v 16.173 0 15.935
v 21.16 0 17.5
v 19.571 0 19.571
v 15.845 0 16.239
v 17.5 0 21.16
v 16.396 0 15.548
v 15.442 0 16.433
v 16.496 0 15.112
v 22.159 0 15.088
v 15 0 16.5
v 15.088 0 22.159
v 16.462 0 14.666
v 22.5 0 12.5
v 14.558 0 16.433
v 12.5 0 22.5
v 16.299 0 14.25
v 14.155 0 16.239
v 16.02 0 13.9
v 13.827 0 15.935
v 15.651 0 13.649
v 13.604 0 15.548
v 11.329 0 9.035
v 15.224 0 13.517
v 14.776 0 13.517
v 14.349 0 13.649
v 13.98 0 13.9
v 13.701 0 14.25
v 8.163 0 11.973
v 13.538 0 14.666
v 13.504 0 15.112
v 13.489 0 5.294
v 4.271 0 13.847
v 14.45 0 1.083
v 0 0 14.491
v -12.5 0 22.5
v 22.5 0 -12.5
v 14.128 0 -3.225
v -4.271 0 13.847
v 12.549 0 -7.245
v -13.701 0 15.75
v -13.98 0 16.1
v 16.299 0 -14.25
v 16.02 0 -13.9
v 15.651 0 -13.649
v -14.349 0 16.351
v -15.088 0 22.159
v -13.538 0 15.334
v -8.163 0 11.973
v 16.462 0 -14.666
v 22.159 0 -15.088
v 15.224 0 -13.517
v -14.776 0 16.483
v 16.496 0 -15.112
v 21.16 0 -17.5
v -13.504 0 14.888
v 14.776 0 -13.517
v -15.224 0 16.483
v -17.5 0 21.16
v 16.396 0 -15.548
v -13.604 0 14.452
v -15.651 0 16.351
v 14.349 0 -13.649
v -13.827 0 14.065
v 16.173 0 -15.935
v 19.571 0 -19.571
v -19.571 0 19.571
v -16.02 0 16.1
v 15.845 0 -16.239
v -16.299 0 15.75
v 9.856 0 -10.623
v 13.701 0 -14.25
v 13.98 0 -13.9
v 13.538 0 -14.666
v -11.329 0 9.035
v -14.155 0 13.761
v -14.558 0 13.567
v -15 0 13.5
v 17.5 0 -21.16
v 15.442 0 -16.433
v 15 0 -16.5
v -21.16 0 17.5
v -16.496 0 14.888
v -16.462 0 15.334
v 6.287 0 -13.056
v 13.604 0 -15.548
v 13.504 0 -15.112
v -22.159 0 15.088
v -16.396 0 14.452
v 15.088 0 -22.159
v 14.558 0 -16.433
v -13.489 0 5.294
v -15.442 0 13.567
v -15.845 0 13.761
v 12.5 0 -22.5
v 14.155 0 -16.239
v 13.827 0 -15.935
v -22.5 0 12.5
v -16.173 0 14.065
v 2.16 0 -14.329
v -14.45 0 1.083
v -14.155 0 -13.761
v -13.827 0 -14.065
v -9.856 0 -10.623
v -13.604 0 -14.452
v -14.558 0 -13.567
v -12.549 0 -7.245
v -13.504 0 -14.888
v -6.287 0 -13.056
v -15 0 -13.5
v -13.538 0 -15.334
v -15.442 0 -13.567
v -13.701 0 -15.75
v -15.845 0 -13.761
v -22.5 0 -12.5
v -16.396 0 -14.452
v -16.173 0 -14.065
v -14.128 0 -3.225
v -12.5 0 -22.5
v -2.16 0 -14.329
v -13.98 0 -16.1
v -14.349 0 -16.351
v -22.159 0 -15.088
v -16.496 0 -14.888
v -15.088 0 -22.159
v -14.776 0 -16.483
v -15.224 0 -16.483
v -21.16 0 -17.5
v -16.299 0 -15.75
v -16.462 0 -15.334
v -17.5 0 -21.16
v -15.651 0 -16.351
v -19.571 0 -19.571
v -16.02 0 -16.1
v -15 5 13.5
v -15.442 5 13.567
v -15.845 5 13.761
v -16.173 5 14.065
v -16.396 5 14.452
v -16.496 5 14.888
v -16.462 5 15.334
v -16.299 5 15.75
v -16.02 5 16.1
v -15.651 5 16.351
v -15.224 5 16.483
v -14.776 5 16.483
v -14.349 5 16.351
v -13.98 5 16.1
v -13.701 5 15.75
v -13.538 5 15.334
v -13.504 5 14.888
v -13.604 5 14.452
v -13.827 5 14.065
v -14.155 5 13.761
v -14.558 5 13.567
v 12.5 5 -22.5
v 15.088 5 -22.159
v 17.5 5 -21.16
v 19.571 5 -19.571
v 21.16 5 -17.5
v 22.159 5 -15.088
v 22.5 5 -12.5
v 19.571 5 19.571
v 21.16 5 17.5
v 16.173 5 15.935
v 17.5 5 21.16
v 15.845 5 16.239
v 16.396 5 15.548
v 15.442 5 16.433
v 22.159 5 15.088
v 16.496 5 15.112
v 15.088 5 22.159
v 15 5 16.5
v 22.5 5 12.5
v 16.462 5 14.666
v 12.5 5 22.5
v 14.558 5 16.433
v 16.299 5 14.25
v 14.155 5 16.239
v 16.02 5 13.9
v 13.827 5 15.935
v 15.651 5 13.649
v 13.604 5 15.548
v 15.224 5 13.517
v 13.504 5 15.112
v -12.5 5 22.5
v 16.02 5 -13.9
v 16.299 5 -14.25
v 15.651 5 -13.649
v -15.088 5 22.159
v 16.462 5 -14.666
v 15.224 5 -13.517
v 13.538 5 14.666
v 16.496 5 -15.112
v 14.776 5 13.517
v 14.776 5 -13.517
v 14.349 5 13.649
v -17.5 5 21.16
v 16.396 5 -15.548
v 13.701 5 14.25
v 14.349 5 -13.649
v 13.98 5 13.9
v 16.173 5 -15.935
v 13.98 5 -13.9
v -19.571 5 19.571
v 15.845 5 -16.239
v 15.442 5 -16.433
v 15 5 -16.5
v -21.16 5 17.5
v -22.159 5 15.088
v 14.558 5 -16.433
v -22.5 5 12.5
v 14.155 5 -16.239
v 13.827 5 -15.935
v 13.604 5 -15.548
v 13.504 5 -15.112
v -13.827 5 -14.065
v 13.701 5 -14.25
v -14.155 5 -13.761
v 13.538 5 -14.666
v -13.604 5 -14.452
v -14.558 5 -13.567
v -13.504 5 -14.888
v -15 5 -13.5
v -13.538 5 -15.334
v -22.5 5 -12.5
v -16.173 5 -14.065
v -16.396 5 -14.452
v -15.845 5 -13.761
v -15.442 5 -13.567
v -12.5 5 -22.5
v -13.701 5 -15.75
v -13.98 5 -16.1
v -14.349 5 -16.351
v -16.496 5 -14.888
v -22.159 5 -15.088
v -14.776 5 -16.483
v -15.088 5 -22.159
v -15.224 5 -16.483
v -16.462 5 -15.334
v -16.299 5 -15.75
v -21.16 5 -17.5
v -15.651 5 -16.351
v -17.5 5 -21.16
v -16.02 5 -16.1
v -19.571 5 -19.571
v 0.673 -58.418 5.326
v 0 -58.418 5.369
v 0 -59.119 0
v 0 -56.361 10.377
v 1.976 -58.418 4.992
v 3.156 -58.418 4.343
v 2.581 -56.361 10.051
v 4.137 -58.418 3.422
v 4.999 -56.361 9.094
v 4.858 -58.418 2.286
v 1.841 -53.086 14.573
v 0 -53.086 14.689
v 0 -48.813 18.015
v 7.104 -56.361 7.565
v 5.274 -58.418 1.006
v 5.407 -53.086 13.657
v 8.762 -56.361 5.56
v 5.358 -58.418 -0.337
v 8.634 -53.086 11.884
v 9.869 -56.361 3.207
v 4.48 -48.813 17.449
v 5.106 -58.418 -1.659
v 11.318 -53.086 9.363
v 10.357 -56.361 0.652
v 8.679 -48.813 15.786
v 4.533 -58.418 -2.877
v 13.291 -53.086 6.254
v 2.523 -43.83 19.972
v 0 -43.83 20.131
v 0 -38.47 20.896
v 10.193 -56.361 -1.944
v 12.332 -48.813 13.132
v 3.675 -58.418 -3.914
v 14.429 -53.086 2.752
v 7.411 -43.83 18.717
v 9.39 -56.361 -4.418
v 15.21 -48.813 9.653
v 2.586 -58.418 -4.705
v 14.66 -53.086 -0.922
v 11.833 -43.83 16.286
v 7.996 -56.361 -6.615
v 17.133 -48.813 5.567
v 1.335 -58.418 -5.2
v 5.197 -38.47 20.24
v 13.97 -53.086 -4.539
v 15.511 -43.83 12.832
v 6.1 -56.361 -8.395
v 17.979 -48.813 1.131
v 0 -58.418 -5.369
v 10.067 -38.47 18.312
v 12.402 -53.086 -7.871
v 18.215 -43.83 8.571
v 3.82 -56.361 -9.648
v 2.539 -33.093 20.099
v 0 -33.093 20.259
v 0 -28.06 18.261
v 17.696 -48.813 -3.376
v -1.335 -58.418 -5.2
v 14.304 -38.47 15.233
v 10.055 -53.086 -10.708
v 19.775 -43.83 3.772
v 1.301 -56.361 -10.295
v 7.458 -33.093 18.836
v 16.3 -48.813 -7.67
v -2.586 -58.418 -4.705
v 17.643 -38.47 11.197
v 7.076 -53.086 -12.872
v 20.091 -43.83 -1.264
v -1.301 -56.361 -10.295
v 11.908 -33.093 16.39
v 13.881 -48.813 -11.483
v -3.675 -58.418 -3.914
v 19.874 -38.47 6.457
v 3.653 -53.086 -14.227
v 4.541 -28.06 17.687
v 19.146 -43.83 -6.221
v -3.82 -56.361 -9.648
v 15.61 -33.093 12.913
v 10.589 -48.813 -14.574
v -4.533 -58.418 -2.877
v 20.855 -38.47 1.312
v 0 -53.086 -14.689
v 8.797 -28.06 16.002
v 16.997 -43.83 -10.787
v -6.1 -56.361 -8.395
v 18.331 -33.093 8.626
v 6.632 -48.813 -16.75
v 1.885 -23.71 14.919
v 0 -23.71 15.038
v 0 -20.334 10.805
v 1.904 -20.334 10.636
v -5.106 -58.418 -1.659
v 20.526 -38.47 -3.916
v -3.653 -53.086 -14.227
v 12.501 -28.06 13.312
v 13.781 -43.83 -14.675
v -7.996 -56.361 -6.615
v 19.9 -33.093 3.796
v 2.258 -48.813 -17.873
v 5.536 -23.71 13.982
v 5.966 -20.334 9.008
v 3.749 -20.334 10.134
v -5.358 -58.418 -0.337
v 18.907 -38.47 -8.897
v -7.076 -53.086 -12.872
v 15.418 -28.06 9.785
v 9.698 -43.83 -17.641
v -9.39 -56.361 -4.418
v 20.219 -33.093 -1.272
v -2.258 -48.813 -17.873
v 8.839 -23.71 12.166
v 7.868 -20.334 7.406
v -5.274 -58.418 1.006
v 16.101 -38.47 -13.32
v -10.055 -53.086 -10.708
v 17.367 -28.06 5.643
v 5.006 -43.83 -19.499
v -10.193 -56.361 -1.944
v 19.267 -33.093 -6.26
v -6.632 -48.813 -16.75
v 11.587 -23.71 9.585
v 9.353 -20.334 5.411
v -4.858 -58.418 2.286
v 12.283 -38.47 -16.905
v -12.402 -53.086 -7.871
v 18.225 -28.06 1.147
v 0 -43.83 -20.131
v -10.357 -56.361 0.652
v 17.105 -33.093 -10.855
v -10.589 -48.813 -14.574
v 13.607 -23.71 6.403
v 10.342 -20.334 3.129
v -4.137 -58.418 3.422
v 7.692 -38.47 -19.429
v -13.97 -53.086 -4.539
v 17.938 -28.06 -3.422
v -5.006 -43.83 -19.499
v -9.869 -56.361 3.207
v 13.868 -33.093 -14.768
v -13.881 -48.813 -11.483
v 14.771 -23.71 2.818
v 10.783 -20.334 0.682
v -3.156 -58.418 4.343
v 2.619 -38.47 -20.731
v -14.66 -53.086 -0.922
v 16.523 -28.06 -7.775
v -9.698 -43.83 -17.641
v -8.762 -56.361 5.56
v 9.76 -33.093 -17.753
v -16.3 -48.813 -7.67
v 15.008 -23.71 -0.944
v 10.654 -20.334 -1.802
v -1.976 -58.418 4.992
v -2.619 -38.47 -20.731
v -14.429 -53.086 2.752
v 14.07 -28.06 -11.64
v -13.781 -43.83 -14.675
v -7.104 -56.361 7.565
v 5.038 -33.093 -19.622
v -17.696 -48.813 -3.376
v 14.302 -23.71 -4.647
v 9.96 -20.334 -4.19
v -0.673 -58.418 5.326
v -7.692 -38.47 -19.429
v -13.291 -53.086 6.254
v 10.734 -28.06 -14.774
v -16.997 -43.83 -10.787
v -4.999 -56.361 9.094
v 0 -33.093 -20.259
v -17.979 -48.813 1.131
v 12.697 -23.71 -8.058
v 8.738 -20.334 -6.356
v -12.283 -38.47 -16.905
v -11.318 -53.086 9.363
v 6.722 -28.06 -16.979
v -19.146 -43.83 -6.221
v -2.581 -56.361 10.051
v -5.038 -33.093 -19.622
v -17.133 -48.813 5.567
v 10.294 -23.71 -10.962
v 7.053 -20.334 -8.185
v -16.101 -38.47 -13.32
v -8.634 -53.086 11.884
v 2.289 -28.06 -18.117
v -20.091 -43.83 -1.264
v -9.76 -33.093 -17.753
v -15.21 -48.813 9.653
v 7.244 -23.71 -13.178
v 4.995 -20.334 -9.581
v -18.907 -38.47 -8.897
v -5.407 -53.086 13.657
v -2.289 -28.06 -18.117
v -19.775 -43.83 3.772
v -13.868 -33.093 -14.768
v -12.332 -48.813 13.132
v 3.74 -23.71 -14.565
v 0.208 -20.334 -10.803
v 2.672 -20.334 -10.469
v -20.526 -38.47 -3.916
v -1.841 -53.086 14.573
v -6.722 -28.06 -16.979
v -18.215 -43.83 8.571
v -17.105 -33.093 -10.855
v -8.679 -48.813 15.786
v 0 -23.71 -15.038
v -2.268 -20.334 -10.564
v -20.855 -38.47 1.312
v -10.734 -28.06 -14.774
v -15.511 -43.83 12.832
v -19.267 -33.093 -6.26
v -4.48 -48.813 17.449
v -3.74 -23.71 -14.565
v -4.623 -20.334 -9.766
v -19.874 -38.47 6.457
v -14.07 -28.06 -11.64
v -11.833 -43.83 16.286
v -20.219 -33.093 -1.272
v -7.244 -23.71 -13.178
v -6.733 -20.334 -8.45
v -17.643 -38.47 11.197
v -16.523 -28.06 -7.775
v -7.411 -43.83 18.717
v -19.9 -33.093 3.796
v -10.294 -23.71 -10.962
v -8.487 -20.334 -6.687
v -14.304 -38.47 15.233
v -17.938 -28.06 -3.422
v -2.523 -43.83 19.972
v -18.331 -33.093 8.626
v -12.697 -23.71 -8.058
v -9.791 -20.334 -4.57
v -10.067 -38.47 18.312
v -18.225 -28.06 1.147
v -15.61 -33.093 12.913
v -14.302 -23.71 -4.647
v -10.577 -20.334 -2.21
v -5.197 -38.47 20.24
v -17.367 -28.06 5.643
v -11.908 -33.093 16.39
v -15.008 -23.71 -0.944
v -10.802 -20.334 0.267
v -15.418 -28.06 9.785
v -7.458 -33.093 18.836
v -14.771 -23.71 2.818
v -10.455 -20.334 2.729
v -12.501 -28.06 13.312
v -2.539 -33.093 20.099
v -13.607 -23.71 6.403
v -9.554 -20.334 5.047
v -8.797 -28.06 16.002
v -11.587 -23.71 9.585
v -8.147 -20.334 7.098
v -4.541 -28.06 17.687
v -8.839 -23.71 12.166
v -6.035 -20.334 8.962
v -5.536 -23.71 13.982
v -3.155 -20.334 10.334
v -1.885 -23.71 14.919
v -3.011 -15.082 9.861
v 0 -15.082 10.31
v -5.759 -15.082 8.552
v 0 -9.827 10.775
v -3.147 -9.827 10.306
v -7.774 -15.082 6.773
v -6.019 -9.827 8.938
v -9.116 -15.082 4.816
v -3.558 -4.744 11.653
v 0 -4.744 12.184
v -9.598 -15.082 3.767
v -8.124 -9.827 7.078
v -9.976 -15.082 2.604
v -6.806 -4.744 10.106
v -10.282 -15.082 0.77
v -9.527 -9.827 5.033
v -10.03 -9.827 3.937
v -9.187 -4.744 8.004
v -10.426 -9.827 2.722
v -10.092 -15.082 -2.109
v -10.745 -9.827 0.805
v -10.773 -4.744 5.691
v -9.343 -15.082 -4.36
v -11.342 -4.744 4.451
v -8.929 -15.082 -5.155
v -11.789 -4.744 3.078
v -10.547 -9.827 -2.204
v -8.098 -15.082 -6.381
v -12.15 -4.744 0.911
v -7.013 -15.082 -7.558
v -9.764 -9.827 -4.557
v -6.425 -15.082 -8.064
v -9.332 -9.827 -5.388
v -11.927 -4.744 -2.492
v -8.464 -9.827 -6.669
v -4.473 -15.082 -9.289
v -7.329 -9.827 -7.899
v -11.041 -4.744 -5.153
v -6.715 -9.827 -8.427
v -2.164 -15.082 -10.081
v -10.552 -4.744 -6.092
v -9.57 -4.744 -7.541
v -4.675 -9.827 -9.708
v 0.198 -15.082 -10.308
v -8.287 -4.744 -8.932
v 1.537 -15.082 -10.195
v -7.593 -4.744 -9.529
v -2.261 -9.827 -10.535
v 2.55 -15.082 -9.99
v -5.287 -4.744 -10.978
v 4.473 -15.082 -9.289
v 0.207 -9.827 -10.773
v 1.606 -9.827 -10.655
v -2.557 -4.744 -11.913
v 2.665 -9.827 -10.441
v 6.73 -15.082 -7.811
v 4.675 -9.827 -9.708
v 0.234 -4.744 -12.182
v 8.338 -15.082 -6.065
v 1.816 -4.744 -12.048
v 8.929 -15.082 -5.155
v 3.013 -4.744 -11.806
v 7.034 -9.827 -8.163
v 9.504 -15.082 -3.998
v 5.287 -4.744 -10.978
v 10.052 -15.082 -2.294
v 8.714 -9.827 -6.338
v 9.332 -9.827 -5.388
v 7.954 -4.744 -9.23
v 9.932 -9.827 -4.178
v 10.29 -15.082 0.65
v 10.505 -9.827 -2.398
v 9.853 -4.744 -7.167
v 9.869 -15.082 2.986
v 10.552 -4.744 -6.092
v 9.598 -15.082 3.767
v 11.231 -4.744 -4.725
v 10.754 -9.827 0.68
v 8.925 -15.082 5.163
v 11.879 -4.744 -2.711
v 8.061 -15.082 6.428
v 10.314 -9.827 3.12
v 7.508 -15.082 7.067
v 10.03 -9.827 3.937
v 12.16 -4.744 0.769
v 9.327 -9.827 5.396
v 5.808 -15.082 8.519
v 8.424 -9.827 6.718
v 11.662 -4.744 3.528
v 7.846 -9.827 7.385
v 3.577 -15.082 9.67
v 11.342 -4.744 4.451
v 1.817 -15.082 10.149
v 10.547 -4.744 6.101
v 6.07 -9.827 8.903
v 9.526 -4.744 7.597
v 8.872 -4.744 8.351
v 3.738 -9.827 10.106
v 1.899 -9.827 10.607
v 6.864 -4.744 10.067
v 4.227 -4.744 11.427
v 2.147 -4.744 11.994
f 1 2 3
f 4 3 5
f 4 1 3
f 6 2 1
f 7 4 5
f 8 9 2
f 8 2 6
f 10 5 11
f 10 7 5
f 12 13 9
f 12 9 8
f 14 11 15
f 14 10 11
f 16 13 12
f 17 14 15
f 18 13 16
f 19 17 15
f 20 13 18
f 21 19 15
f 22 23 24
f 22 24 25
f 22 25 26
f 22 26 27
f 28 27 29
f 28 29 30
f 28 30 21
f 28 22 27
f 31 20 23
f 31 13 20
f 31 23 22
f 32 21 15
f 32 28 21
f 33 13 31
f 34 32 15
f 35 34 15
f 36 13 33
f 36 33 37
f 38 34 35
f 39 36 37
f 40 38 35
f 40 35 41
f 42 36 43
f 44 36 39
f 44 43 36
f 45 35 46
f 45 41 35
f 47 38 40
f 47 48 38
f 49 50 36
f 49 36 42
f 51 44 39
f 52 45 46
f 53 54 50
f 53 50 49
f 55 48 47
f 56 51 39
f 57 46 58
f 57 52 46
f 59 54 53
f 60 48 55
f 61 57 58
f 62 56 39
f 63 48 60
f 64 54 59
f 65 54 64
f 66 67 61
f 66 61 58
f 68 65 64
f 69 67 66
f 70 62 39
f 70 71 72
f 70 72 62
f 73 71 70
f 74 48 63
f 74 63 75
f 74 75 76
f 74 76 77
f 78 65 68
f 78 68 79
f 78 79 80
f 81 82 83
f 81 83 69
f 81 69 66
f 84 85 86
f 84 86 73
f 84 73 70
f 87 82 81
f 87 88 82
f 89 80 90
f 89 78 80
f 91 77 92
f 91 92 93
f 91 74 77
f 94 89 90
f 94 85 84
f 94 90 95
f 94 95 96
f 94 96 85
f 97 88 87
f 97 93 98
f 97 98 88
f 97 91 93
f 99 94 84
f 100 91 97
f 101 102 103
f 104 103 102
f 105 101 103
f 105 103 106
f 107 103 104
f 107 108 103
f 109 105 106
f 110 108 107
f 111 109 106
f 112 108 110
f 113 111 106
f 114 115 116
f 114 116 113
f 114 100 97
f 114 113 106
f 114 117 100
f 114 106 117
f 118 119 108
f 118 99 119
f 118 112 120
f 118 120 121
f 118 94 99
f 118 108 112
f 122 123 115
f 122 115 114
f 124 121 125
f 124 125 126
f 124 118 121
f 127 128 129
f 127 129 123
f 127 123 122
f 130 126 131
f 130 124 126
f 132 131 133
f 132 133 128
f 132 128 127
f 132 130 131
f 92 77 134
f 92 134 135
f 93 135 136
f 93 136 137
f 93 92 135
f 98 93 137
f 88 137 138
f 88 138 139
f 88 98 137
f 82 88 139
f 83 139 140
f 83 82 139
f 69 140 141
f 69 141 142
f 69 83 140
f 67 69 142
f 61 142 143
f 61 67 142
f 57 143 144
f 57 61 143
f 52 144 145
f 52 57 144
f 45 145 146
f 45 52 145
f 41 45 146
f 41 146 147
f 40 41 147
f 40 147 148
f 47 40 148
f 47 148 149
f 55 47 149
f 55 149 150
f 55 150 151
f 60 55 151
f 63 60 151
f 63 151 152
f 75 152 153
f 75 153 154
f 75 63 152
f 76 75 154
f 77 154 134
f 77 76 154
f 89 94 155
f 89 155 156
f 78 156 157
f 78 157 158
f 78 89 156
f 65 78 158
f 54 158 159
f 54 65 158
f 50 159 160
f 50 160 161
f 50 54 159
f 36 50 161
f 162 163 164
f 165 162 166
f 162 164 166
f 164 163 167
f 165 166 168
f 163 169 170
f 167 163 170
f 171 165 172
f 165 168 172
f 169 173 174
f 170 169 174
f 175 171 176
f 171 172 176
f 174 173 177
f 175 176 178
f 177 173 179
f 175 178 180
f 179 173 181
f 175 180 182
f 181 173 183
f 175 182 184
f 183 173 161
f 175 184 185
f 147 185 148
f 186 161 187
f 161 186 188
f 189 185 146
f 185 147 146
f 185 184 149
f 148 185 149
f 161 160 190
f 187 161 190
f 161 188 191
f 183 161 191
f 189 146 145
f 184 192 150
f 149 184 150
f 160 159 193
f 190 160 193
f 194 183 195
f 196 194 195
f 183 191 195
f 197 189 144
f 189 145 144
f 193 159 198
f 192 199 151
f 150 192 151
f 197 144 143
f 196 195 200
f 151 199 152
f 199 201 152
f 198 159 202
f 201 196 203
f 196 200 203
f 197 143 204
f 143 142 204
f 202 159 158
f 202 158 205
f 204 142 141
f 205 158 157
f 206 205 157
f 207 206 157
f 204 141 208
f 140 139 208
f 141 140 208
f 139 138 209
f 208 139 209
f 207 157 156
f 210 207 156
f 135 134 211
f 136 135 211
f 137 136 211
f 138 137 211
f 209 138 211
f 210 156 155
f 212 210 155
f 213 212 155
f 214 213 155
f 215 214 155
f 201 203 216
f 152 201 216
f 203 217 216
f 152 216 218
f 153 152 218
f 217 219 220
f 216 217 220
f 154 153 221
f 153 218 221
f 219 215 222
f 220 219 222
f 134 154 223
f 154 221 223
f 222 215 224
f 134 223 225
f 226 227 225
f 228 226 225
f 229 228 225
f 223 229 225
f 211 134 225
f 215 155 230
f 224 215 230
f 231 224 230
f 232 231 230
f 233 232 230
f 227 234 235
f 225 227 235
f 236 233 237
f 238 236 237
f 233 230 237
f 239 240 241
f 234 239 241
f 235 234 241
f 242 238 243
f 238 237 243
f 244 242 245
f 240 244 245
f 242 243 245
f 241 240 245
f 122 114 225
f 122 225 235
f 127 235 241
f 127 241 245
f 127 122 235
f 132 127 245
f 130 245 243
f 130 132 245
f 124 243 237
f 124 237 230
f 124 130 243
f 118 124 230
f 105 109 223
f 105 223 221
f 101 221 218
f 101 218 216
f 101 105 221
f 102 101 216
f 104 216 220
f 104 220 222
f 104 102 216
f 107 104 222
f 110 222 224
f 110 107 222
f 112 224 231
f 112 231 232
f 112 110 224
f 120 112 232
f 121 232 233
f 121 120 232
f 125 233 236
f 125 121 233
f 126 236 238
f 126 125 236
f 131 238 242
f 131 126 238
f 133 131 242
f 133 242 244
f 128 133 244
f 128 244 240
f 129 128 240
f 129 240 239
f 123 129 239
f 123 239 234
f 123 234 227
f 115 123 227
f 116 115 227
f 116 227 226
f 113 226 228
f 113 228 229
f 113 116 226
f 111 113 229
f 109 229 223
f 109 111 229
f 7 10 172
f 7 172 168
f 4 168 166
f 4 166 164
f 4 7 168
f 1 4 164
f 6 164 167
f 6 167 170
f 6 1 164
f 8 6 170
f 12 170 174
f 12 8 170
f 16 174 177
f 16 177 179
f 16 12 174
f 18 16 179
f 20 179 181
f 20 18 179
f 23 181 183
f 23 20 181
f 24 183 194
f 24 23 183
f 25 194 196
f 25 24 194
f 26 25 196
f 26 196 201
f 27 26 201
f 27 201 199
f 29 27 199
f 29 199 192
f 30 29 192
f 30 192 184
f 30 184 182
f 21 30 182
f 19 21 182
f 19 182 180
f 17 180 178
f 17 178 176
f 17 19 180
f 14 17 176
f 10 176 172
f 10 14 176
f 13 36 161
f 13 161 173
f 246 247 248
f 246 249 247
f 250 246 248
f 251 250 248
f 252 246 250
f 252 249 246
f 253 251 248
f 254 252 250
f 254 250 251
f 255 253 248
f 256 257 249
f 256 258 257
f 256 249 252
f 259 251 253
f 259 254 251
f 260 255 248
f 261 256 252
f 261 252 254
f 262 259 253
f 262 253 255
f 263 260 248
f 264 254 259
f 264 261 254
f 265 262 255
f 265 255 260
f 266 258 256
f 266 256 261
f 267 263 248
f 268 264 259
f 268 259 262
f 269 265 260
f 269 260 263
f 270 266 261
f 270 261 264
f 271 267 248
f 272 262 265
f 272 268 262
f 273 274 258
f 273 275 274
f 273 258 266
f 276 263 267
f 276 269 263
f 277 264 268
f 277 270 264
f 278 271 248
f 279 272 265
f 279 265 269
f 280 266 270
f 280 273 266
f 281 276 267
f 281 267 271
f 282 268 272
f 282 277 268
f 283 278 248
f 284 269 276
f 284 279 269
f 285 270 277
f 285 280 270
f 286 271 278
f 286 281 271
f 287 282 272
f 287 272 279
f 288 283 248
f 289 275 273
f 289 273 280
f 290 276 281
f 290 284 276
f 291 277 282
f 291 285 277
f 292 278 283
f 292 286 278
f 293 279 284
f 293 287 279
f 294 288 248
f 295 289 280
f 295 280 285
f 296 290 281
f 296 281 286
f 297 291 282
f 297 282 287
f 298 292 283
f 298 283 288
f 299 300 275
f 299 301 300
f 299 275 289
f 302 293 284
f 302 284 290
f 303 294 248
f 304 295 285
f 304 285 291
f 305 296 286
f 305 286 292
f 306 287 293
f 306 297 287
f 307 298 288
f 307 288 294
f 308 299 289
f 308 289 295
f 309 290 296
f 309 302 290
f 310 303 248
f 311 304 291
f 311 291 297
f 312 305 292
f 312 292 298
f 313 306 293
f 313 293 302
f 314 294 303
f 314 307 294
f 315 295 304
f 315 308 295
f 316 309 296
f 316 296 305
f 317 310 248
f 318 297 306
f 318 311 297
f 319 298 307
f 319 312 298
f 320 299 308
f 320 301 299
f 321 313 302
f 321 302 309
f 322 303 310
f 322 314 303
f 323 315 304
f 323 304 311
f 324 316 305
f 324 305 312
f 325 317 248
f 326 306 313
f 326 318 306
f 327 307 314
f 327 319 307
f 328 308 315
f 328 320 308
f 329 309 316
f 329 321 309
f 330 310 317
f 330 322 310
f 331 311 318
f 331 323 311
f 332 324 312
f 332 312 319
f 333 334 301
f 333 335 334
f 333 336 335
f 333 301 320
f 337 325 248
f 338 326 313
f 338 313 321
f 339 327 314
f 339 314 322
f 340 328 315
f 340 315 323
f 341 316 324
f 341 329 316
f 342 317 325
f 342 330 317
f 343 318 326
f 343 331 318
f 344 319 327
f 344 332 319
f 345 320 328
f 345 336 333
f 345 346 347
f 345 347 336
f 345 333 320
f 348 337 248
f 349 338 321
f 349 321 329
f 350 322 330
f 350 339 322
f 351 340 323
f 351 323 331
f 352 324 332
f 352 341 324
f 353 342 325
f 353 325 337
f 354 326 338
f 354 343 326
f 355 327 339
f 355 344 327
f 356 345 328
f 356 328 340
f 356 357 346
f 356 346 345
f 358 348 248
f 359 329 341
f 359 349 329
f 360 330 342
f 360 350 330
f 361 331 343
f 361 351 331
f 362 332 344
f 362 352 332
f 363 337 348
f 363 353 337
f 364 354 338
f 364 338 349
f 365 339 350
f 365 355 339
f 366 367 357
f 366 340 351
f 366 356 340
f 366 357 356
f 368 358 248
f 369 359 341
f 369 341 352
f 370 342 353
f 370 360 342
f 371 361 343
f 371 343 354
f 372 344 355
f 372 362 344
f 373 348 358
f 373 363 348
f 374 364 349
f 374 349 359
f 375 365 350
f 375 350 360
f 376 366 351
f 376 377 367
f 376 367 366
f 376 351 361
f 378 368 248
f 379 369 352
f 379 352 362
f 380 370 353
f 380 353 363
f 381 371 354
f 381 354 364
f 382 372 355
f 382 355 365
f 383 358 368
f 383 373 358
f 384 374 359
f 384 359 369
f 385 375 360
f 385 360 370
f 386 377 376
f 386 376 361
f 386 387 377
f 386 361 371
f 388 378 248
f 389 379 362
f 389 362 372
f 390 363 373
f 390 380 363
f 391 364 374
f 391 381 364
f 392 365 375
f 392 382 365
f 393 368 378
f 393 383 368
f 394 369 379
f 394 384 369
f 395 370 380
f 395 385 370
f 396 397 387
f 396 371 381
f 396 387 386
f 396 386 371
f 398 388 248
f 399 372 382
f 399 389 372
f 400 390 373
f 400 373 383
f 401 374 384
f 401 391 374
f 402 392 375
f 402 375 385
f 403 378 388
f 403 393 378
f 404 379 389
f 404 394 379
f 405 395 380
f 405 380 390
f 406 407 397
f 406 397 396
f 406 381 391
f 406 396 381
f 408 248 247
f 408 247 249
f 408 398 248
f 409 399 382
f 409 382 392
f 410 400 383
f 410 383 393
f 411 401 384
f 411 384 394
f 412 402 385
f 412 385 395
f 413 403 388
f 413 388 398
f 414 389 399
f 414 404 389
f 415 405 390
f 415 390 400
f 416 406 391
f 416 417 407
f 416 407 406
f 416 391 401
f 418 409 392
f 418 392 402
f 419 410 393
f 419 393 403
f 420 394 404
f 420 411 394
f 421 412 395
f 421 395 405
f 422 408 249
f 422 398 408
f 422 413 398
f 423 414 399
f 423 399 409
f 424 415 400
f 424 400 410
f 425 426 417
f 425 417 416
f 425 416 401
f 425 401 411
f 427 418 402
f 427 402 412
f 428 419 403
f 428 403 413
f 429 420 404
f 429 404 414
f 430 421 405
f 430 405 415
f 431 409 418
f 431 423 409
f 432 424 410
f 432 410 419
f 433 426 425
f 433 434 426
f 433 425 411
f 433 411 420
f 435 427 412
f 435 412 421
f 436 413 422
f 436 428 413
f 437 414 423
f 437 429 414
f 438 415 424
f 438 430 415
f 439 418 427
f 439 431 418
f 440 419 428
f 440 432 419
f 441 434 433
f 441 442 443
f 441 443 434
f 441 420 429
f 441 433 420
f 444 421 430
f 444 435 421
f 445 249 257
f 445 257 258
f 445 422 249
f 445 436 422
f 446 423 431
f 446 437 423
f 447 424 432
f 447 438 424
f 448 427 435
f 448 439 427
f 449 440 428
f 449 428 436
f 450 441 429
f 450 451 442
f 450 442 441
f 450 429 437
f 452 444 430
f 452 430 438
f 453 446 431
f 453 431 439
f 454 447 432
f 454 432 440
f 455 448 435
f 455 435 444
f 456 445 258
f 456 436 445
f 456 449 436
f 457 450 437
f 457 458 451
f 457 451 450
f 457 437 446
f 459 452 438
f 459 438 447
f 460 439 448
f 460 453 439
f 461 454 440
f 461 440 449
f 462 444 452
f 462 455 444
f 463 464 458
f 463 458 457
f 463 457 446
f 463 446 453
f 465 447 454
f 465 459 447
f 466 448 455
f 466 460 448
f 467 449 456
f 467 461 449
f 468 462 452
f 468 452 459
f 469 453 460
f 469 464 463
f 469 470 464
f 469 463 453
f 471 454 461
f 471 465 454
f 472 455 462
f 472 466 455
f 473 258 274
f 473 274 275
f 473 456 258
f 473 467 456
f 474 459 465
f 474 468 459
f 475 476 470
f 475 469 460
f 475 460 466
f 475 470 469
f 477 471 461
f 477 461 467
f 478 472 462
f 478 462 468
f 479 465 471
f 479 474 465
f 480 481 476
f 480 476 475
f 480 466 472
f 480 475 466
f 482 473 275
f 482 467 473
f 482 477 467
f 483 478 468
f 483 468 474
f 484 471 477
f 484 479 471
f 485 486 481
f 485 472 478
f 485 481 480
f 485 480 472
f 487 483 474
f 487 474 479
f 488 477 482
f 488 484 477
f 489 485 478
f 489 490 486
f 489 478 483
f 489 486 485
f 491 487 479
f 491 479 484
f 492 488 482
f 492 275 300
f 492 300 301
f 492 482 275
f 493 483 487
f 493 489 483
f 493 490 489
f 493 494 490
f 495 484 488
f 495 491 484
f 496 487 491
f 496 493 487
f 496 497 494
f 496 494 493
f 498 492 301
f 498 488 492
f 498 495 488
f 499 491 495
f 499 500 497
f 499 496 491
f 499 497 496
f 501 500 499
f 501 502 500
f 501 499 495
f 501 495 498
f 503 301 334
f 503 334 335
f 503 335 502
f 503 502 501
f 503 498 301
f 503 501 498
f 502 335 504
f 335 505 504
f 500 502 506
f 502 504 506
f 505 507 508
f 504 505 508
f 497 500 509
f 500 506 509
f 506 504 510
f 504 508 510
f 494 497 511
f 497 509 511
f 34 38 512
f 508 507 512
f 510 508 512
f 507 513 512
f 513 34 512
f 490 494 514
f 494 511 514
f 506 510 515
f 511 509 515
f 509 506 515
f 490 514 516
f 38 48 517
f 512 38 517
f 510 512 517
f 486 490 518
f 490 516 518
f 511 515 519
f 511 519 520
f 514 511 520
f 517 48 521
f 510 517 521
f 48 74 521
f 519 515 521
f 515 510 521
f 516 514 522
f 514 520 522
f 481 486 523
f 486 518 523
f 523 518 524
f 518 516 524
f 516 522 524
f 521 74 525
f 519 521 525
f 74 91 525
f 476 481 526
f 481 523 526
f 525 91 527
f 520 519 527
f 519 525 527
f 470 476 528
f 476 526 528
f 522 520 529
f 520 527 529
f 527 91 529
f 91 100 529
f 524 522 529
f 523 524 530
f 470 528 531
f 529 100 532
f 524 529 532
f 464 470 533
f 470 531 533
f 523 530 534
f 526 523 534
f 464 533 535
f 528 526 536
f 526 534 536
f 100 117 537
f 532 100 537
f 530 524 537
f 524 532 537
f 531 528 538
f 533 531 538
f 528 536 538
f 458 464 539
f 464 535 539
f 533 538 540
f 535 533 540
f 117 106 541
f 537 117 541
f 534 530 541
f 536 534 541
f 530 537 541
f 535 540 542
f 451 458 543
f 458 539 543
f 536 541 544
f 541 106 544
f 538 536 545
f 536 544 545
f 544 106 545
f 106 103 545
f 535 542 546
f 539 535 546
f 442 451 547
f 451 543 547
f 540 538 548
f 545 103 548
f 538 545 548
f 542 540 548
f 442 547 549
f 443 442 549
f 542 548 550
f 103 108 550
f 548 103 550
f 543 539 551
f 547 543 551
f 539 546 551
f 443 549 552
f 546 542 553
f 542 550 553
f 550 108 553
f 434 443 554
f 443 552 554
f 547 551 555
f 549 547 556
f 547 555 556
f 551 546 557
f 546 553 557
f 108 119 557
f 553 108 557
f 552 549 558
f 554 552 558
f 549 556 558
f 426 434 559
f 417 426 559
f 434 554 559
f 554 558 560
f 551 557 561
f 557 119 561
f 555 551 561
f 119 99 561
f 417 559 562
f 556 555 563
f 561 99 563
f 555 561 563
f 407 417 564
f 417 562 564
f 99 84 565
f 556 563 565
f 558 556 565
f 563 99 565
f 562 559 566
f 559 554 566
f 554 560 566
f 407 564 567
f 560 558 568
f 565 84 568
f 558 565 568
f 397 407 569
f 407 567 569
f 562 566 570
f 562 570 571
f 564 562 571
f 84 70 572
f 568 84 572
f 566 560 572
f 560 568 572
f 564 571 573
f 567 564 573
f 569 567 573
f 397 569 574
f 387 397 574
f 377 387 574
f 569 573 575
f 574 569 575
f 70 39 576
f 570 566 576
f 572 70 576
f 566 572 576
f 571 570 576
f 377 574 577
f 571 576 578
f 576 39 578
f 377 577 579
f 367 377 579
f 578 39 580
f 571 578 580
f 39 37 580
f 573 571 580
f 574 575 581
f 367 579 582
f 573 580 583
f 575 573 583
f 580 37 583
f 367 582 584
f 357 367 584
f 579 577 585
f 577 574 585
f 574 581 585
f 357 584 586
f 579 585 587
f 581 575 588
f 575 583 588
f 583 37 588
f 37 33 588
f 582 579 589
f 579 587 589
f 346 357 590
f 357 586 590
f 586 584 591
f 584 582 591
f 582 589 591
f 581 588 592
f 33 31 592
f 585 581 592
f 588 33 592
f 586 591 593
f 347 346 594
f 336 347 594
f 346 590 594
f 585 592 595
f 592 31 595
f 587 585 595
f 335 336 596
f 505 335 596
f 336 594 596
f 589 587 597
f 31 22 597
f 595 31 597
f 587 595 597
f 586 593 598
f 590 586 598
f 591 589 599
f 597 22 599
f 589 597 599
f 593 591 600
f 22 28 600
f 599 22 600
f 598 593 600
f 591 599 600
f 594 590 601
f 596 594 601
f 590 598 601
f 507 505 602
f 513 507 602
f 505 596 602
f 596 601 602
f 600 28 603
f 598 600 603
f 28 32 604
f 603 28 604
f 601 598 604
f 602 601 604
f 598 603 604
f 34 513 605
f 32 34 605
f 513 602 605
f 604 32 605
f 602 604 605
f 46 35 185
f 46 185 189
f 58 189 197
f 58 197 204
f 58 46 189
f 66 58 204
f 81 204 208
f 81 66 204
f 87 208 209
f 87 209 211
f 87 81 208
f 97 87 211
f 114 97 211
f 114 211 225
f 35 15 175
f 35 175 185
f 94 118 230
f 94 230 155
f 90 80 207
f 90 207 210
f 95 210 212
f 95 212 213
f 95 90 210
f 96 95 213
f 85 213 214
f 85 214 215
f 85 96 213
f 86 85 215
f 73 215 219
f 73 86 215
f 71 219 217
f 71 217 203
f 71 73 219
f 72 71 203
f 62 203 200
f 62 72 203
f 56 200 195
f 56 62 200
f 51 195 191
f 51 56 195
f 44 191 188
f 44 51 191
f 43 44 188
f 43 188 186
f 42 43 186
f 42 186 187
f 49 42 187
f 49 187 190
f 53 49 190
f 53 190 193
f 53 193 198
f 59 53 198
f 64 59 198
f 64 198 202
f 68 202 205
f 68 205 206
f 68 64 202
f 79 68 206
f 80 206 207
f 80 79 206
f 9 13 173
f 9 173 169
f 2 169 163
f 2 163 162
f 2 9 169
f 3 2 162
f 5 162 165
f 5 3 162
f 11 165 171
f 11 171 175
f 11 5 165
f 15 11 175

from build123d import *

# Parameters (mm, degrees)
SKETCH1_R           = 1.5
BOSS_EXTRUDE1_DEPTH = 5


with BuildPart() as part:
    # Sketch1 → Boss-Extrude1 (new body)
    with BuildSketch(Plane(origin=(0, 0, 0), x_dir=(1, 0, 0), z_dir=(0, 1, 0))):
        with BuildLine():
            Line((12.5, -22.5), (-12.5, -22.5))
            ThreePointArc((-12.5, -22.5), (-19.571067812, -19.571067812), (-22.5, -12.5))
            Line((-22.5, -12.5), (-22.5, 12.5))
            ThreePointArc((-22.5, 12.5), (-19.571067812, 19.571067812), (-12.5, 22.5))
            Line((-12.5, 22.5), (12.5, 22.5))
            ThreePointArc((12.5, 22.5), (19.571067812, 19.571067812), (22.5, 12.5))
            Line((22.5, 12.5), (22.5, -12.5))
            ThreePointArc((22.5, -12.5), (19.571067812, -19.571067812), (12.5, -22.5))
        make_face()
        with Locations(Location((-15, 15, 0), (0, 0, 270))):
            Circle(SKETCH1_R, mode=Mode.SUBTRACT)
        with Locations(Location((15, 15, 0), (0, 0, 90))):
            Circle(SKETCH1_R, mode=Mode.SUBTRACT)
        with Locations(Location((15, -15, 0), (0, 0, 270))):
            Circle(SKETCH1_R, mode=Mode.SUBTRACT)
        with Locations(Location((-15, -15, 0), (0, 0, 90))):
            Circle(SKETCH1_R, mode=Mode.SUBTRACT)
    extrude(amount=BOSS_EXTRUDE1_DEPTH)

    # Sketch5 → Revolve5 (revolve)
    with BuildSketch(Plane.XY, mode=Mode.PRIVATE) as revolve5_sk:
        with BuildLine():
            Line((0, 0), (0, -30))
            Line((0, -30), (-14.490872109, -30))
            ThreePointArc((-14.490872109, -30), (-10.310219401, -15), (-14.490872109, 0))
            Line((-14.490872109, 0), (0, 0))
        make_face()
    revolve(revolve5_sk.sketch.rotate(Axis((0, 6.623218914, 0), (0, -1, 0)), 270), axis=Axis((0, 6.623218914, 0), (0, -1, 0)))

    # Sketch6 → Revolve6 (revolve)
    with BuildSketch(Plane(origin=(0, 0, 0), x_dir=(0, 0, -1), z_dir=(1, 0, 0))):
        with BuildLine():
            Line((0, -17.323751058), (0, -59.119175033))
            ThreePointArc((0, -59.119175033), (-20.897711988, -38.221463045), (0, -17.323751058))
        make_face()
    revolve(axis=Axis((0, -62.962580504, 0), (0, 1, 0)))


solid = part.part
